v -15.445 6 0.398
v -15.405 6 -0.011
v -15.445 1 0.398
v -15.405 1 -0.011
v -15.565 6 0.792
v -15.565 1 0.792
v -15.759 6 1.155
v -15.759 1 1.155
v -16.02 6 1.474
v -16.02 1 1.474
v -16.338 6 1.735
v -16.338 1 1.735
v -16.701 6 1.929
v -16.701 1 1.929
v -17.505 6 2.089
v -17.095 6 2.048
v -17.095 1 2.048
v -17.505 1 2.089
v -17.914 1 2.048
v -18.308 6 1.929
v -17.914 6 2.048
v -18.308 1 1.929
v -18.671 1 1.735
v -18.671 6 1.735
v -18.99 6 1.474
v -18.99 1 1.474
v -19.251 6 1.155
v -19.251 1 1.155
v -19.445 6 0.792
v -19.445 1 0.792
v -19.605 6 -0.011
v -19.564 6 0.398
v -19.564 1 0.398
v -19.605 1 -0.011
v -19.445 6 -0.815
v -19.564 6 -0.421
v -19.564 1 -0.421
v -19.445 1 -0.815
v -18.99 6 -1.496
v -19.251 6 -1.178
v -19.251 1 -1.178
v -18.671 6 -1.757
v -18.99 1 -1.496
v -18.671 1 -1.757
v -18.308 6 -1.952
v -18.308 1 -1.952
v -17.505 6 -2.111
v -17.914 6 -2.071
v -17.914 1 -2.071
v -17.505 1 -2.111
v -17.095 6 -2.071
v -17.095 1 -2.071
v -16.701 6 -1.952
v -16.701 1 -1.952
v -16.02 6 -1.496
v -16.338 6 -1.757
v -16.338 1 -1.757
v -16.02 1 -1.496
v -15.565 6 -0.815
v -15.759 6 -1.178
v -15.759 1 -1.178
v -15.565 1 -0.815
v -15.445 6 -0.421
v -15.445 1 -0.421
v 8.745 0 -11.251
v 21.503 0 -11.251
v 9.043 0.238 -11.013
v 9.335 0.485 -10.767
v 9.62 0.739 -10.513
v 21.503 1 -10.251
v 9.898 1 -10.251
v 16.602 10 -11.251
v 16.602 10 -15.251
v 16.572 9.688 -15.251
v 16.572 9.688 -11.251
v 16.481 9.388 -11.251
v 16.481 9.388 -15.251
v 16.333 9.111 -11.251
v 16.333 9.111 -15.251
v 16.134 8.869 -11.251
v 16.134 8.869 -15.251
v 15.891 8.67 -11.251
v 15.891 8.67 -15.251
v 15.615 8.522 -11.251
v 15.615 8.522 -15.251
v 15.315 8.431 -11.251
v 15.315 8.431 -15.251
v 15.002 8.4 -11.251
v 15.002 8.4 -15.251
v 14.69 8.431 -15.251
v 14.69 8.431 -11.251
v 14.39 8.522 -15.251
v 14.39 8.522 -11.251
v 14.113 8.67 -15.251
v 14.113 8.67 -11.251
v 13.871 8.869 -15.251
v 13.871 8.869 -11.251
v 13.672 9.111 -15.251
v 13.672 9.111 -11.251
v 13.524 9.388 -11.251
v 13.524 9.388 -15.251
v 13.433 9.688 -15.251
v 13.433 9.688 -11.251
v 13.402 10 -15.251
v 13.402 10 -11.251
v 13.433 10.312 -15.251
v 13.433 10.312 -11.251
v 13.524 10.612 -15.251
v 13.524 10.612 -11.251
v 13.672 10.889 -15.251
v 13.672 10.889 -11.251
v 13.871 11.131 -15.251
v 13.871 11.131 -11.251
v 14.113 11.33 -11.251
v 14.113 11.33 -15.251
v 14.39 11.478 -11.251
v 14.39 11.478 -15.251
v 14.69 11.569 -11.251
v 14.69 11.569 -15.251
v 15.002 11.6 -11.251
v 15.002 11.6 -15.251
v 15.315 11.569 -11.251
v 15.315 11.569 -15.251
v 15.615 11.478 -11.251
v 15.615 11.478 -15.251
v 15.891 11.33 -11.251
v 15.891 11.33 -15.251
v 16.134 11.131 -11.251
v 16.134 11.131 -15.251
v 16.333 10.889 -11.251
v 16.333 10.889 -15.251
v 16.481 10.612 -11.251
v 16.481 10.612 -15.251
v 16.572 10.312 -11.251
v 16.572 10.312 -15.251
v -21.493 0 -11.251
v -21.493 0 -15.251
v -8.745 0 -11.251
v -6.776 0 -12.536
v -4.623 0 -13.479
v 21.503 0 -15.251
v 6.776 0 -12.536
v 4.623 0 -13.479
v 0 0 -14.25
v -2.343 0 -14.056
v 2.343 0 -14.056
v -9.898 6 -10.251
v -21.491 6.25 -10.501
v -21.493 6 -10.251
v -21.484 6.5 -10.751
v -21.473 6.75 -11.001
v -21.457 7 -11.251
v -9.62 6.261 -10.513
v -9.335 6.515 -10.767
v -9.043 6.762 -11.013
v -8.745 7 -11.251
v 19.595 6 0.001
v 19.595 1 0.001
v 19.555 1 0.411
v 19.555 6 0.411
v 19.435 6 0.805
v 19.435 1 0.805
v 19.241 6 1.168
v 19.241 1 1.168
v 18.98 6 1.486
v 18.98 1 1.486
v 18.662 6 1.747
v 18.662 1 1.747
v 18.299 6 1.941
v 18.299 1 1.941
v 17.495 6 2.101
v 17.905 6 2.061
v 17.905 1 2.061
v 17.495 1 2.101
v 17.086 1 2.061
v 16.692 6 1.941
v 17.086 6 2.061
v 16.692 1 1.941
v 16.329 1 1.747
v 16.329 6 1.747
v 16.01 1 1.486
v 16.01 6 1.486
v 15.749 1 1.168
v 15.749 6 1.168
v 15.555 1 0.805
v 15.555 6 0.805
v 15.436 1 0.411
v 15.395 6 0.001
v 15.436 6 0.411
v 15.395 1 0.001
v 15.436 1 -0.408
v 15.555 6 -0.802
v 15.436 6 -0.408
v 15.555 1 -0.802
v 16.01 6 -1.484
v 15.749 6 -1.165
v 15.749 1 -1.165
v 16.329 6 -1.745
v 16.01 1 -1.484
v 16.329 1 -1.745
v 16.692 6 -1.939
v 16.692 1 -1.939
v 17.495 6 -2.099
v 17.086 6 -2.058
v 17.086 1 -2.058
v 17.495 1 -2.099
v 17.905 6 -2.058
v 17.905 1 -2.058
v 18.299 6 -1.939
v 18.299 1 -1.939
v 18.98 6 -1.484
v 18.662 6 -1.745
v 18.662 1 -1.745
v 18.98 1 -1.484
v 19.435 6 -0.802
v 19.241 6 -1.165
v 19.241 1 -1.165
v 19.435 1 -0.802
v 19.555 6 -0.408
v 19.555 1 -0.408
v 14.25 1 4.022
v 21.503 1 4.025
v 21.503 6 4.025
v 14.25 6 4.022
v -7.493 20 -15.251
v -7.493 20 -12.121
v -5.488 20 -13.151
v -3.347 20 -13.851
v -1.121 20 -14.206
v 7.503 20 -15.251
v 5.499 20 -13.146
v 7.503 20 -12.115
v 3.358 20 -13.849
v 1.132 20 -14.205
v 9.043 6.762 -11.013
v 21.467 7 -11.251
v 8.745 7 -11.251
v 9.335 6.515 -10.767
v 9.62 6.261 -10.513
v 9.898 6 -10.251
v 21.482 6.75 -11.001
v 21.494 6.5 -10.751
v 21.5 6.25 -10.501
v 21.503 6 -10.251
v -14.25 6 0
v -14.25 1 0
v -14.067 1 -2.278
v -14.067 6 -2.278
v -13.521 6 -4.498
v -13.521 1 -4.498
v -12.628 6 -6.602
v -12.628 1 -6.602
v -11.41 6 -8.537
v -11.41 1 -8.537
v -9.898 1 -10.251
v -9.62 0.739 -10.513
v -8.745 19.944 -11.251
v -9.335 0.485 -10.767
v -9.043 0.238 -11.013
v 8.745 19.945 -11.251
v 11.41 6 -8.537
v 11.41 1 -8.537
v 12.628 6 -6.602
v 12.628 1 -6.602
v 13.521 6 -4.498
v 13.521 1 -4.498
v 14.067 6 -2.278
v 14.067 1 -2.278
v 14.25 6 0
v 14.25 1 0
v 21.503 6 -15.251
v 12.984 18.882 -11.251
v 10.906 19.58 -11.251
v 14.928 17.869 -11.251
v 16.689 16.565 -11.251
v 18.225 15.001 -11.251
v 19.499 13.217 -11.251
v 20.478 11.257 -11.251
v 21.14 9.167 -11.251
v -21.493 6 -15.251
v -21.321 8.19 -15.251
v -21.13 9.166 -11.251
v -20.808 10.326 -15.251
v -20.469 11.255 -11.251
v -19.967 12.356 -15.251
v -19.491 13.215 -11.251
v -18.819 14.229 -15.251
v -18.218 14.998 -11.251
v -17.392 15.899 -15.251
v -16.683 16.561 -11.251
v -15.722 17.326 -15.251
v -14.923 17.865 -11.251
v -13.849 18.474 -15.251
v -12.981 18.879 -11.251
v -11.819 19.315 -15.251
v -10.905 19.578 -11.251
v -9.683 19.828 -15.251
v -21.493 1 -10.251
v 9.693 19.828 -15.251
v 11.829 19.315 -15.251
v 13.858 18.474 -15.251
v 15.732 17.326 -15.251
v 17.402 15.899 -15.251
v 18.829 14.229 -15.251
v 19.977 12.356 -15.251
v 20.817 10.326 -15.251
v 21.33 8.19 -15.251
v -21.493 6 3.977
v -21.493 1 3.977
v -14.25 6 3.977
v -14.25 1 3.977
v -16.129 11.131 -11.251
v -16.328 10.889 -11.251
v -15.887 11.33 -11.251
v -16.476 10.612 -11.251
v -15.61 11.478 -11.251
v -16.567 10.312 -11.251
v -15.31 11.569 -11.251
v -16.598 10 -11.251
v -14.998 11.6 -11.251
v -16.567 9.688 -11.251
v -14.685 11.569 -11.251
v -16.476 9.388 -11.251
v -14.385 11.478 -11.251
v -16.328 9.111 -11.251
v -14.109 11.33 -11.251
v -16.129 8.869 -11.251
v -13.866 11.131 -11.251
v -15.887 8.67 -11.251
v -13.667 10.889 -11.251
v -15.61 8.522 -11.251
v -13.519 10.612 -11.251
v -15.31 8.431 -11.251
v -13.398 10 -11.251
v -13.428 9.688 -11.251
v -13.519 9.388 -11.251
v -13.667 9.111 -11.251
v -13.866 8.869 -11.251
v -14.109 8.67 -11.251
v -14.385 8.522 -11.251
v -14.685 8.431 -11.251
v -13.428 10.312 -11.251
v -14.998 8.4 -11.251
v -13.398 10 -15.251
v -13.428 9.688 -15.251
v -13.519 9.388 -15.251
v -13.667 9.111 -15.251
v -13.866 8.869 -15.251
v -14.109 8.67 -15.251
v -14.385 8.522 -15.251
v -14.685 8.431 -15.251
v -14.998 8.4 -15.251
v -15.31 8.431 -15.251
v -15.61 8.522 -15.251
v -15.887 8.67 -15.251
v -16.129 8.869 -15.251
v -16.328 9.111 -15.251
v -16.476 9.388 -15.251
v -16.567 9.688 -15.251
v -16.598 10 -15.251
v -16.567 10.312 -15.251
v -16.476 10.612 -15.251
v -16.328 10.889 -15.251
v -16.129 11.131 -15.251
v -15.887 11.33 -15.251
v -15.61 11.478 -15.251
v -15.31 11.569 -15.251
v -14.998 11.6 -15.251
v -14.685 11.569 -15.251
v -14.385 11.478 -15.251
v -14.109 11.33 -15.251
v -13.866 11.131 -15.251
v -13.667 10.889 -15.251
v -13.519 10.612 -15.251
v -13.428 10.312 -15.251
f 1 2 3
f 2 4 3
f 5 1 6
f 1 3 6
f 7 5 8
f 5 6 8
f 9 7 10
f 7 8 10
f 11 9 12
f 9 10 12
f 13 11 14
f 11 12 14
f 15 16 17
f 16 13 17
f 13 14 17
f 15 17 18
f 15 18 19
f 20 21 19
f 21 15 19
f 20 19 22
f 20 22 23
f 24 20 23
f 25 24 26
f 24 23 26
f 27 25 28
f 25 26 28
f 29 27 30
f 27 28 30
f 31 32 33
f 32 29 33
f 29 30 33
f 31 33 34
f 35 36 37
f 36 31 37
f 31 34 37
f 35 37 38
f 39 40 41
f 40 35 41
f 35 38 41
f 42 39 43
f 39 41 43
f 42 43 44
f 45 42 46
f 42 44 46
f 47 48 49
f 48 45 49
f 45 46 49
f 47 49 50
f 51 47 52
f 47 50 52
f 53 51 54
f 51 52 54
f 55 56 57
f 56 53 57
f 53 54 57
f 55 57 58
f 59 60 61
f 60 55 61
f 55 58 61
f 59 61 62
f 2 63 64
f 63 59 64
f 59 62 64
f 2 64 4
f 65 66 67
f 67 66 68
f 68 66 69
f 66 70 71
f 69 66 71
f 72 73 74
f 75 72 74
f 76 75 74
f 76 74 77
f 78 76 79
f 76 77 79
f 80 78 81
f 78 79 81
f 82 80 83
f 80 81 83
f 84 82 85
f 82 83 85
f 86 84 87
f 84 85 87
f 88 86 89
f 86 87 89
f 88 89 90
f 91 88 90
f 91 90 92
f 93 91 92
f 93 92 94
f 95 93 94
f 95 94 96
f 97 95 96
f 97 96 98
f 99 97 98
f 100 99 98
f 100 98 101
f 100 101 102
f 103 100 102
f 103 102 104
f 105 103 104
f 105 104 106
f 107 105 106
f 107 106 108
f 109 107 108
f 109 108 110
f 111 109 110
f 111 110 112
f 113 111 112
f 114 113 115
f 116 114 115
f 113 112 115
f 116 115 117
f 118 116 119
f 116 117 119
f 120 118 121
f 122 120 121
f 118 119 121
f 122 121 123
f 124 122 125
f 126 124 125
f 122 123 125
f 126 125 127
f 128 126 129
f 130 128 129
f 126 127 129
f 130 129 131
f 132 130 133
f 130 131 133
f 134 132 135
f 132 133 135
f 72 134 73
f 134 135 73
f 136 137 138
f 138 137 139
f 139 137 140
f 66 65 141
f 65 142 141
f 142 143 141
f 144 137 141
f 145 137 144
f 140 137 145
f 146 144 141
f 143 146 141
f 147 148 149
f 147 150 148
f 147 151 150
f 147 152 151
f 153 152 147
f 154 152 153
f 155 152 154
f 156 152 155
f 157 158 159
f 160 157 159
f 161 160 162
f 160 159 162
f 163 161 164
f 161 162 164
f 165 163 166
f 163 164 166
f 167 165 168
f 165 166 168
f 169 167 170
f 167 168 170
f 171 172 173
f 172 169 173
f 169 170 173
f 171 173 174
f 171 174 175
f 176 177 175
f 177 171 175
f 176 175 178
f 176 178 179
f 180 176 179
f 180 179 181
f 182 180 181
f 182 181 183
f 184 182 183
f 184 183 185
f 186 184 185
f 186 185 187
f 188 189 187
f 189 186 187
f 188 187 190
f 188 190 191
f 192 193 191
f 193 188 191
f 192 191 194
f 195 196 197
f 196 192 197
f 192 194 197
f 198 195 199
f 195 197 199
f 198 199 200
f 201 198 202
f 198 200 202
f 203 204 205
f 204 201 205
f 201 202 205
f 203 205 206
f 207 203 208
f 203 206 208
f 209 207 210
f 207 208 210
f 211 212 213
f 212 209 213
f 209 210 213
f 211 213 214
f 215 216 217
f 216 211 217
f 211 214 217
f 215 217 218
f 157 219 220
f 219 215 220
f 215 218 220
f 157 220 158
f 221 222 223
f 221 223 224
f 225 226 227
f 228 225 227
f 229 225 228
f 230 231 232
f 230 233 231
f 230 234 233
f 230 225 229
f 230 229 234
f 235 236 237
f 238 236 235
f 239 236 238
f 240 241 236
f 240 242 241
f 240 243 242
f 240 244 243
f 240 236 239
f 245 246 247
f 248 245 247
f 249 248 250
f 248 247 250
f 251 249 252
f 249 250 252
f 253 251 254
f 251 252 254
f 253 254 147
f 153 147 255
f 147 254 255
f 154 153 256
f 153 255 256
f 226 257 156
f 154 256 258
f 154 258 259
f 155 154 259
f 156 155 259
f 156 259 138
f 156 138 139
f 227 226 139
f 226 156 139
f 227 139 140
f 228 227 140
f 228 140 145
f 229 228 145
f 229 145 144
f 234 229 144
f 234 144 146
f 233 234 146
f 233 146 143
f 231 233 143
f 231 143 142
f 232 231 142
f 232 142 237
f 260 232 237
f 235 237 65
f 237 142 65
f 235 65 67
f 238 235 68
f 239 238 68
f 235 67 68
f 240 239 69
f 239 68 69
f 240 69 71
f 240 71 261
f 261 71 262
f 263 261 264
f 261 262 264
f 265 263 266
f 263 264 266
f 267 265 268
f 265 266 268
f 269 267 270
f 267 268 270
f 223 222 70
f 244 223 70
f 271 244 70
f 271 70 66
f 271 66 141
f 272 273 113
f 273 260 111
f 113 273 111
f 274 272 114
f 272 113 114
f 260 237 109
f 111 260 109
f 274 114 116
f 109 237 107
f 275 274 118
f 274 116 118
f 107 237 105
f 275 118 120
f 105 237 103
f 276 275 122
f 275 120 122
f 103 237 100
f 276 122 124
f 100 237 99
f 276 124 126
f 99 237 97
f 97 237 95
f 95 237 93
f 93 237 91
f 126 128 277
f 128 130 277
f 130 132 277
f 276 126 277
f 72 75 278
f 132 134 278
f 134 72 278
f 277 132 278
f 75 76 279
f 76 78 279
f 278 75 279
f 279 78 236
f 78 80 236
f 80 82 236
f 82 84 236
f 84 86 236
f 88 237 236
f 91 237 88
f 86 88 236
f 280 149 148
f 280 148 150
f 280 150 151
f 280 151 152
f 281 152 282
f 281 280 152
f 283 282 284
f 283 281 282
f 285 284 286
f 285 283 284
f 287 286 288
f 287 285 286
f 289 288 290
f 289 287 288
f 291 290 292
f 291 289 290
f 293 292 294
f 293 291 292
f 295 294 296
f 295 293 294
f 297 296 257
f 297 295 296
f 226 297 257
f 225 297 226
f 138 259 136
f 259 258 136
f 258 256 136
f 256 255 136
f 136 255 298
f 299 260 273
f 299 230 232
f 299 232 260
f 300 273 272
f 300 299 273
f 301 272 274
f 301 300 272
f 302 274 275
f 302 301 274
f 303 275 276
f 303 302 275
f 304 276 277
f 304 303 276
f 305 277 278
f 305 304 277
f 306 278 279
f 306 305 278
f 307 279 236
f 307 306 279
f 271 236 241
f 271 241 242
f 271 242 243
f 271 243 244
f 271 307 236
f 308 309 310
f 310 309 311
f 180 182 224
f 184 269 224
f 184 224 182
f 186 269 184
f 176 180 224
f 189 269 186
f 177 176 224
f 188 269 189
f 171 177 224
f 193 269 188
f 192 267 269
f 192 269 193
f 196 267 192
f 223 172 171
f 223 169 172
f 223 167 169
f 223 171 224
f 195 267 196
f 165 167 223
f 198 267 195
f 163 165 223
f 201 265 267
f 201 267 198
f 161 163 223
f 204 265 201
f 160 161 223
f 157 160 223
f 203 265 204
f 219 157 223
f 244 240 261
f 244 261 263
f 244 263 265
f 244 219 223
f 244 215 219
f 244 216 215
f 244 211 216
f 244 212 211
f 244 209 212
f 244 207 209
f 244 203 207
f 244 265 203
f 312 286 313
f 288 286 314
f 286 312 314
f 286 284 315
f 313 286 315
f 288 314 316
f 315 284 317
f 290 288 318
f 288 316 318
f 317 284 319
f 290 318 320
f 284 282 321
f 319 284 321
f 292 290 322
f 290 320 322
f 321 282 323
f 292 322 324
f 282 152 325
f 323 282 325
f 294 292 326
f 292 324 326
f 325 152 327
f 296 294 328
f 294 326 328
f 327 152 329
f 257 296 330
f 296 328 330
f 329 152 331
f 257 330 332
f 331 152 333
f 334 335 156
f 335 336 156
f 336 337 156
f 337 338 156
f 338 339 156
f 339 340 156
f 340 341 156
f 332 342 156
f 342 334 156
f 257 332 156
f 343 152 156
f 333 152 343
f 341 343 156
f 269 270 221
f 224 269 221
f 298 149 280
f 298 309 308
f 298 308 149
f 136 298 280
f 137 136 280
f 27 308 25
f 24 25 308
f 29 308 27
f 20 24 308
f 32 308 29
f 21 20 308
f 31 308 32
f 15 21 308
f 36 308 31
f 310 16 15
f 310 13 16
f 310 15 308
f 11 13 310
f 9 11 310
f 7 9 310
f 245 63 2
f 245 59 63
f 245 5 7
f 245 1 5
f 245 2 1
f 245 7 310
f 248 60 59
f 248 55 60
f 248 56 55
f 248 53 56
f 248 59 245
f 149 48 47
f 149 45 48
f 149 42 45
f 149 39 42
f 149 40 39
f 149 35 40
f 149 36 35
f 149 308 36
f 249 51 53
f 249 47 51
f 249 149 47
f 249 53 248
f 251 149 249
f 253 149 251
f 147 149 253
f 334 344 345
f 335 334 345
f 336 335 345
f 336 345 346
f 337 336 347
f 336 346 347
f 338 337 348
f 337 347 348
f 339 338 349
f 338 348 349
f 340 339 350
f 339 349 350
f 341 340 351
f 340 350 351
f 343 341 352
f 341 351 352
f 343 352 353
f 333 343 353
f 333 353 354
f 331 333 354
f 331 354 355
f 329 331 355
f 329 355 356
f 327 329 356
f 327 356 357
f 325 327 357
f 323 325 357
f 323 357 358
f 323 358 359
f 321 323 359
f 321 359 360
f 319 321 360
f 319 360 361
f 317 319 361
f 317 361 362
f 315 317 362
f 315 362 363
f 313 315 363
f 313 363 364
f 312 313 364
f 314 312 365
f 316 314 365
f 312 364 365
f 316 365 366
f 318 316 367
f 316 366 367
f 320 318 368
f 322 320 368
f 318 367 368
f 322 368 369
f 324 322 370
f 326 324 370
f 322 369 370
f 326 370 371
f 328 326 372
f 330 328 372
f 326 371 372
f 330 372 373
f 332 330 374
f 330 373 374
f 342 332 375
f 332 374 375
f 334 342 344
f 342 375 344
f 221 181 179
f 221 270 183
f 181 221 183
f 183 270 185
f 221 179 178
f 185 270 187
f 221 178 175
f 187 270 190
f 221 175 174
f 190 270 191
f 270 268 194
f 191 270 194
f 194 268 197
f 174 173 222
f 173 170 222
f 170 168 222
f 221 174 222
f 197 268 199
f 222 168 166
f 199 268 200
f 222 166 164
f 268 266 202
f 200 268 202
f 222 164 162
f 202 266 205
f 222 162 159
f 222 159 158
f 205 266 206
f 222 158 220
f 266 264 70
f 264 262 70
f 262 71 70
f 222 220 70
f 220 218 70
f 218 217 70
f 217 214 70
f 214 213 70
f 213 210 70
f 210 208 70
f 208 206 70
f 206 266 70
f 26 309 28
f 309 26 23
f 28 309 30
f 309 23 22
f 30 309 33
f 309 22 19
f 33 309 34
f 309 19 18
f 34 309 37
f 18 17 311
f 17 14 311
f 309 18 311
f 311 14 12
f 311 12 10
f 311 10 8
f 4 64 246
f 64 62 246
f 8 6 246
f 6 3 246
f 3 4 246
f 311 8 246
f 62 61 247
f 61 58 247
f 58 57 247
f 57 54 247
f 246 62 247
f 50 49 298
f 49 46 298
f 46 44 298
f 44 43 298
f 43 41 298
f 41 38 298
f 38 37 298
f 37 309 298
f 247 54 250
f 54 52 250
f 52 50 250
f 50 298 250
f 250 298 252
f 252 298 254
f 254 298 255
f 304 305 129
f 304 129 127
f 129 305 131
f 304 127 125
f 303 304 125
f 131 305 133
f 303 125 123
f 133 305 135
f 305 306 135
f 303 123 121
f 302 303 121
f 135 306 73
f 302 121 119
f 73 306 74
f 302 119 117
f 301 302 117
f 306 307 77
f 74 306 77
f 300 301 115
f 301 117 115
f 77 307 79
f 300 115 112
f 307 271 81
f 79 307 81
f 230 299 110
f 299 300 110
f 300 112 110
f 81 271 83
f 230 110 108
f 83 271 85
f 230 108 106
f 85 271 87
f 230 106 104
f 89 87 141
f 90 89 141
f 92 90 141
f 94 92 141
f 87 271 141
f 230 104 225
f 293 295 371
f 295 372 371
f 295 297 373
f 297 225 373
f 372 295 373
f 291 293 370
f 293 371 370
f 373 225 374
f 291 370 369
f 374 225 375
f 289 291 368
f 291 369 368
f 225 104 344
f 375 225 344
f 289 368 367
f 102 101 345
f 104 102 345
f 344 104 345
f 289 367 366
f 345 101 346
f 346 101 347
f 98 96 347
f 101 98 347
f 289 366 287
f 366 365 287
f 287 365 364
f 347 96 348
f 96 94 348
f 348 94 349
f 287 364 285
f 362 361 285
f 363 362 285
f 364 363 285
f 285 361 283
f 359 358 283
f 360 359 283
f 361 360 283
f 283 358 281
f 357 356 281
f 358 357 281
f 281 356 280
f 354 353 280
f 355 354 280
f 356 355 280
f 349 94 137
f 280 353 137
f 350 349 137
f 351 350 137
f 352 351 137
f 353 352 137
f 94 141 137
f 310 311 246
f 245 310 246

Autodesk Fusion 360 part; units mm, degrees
sketch "Sketch1" plane through (0, 0, 0) normal (0, 1, 0) x (1, 0, 0)
  line L0 (-21.4929, -3.9767) -> (-14.25, -3.9767)
  arc A0 (14.25, 0) -> (-14.25, 0) centre (0, 0) ccw
  line L1 (-21.4929, -3.9767) -> (-21.4929, 15.251)
  line L2 (21.5026, 15.251) -> (-21.4929, 15.251)
  circle A1 centre (-17.5048, 0.0114) radius 2.1
  line L3 (21.5026, -4.0254) -> (14.25, -4.0217)
  circle A2 centre (17.4952, -0.0012) radius 2.1
  line L4 (21.5026, -4.0254) -> (21.5026, 15.251)
  line L5 (-21.4929, 11.251) -> (-8.7451, 11.251)
  line L6 (8.7451, 11.251) -> (21.5026, 11.251)
  line L7 (-14.25, -3.9767) -> (-14.25, 0)
  line L8 (14.25, 0) -> (14.25, -4.0217)
  dimension "d1" = 28.5
  dimension "d4" = 4.2
  dimension "d14" = 4
  dimension "d33" = 35
  dimension "d34" = 4.2
extrude "Extrude1" add sketch "Sketch1" along normal blind 5 from surface at 1
extrude "Extrude3" add sketch "Sketch1" along normal blind 20 contours A0 L1 L2 L4 L5 L6
sketch "Sketch4" plane through (0, 0, -15.251) normal (0, 0, -1) x (1, 0, 0)
  line L0 (-21.4929, 0) -> (-21.4929, -20)
  line L1 (-21.4929, -20) -> (21.5026, -20)
  line L2 (21.5026, -20) -> (21.5026, 0)
  line L3 (-21.4929, 0) -> (-21.4929, -20)
  line L4 (-21.4929, -20) -> (21.5026, -20)
  line L5 (21.5026, -20) -> (21.5026, 0)
  line L6 (21.5026, 0) -> (-21.4929, 0)
  circle A0 centre (-14.9976, -10) radius 1.6
  line L7 (0.0024, 3.9978) -> (0.0024, -22.1306)
  circle A1 centre (15.0024, -10) radius 1.6
  dimension "d50" = 3.2
  dimension "d51" = 10
  dimension "d52" = 15
extrude "Extrude8" cut sketch "Sketch4" along normal blind -8 and the other way blind -2 contours A0 | A1
chamfer "Chamfer1" distance 1 angle 45 4 edges at (-15.119, 1, -11.251) (15.1239, 1, -11.251) (-15.119, 6, -11.251) (15.1239, 6, -11.251)
fillet "Fillet1" radius 14 2 edges at (-21.4929, 20, -13.251) (21.5026, 20, -13.251)
equation "d34 = d4"
